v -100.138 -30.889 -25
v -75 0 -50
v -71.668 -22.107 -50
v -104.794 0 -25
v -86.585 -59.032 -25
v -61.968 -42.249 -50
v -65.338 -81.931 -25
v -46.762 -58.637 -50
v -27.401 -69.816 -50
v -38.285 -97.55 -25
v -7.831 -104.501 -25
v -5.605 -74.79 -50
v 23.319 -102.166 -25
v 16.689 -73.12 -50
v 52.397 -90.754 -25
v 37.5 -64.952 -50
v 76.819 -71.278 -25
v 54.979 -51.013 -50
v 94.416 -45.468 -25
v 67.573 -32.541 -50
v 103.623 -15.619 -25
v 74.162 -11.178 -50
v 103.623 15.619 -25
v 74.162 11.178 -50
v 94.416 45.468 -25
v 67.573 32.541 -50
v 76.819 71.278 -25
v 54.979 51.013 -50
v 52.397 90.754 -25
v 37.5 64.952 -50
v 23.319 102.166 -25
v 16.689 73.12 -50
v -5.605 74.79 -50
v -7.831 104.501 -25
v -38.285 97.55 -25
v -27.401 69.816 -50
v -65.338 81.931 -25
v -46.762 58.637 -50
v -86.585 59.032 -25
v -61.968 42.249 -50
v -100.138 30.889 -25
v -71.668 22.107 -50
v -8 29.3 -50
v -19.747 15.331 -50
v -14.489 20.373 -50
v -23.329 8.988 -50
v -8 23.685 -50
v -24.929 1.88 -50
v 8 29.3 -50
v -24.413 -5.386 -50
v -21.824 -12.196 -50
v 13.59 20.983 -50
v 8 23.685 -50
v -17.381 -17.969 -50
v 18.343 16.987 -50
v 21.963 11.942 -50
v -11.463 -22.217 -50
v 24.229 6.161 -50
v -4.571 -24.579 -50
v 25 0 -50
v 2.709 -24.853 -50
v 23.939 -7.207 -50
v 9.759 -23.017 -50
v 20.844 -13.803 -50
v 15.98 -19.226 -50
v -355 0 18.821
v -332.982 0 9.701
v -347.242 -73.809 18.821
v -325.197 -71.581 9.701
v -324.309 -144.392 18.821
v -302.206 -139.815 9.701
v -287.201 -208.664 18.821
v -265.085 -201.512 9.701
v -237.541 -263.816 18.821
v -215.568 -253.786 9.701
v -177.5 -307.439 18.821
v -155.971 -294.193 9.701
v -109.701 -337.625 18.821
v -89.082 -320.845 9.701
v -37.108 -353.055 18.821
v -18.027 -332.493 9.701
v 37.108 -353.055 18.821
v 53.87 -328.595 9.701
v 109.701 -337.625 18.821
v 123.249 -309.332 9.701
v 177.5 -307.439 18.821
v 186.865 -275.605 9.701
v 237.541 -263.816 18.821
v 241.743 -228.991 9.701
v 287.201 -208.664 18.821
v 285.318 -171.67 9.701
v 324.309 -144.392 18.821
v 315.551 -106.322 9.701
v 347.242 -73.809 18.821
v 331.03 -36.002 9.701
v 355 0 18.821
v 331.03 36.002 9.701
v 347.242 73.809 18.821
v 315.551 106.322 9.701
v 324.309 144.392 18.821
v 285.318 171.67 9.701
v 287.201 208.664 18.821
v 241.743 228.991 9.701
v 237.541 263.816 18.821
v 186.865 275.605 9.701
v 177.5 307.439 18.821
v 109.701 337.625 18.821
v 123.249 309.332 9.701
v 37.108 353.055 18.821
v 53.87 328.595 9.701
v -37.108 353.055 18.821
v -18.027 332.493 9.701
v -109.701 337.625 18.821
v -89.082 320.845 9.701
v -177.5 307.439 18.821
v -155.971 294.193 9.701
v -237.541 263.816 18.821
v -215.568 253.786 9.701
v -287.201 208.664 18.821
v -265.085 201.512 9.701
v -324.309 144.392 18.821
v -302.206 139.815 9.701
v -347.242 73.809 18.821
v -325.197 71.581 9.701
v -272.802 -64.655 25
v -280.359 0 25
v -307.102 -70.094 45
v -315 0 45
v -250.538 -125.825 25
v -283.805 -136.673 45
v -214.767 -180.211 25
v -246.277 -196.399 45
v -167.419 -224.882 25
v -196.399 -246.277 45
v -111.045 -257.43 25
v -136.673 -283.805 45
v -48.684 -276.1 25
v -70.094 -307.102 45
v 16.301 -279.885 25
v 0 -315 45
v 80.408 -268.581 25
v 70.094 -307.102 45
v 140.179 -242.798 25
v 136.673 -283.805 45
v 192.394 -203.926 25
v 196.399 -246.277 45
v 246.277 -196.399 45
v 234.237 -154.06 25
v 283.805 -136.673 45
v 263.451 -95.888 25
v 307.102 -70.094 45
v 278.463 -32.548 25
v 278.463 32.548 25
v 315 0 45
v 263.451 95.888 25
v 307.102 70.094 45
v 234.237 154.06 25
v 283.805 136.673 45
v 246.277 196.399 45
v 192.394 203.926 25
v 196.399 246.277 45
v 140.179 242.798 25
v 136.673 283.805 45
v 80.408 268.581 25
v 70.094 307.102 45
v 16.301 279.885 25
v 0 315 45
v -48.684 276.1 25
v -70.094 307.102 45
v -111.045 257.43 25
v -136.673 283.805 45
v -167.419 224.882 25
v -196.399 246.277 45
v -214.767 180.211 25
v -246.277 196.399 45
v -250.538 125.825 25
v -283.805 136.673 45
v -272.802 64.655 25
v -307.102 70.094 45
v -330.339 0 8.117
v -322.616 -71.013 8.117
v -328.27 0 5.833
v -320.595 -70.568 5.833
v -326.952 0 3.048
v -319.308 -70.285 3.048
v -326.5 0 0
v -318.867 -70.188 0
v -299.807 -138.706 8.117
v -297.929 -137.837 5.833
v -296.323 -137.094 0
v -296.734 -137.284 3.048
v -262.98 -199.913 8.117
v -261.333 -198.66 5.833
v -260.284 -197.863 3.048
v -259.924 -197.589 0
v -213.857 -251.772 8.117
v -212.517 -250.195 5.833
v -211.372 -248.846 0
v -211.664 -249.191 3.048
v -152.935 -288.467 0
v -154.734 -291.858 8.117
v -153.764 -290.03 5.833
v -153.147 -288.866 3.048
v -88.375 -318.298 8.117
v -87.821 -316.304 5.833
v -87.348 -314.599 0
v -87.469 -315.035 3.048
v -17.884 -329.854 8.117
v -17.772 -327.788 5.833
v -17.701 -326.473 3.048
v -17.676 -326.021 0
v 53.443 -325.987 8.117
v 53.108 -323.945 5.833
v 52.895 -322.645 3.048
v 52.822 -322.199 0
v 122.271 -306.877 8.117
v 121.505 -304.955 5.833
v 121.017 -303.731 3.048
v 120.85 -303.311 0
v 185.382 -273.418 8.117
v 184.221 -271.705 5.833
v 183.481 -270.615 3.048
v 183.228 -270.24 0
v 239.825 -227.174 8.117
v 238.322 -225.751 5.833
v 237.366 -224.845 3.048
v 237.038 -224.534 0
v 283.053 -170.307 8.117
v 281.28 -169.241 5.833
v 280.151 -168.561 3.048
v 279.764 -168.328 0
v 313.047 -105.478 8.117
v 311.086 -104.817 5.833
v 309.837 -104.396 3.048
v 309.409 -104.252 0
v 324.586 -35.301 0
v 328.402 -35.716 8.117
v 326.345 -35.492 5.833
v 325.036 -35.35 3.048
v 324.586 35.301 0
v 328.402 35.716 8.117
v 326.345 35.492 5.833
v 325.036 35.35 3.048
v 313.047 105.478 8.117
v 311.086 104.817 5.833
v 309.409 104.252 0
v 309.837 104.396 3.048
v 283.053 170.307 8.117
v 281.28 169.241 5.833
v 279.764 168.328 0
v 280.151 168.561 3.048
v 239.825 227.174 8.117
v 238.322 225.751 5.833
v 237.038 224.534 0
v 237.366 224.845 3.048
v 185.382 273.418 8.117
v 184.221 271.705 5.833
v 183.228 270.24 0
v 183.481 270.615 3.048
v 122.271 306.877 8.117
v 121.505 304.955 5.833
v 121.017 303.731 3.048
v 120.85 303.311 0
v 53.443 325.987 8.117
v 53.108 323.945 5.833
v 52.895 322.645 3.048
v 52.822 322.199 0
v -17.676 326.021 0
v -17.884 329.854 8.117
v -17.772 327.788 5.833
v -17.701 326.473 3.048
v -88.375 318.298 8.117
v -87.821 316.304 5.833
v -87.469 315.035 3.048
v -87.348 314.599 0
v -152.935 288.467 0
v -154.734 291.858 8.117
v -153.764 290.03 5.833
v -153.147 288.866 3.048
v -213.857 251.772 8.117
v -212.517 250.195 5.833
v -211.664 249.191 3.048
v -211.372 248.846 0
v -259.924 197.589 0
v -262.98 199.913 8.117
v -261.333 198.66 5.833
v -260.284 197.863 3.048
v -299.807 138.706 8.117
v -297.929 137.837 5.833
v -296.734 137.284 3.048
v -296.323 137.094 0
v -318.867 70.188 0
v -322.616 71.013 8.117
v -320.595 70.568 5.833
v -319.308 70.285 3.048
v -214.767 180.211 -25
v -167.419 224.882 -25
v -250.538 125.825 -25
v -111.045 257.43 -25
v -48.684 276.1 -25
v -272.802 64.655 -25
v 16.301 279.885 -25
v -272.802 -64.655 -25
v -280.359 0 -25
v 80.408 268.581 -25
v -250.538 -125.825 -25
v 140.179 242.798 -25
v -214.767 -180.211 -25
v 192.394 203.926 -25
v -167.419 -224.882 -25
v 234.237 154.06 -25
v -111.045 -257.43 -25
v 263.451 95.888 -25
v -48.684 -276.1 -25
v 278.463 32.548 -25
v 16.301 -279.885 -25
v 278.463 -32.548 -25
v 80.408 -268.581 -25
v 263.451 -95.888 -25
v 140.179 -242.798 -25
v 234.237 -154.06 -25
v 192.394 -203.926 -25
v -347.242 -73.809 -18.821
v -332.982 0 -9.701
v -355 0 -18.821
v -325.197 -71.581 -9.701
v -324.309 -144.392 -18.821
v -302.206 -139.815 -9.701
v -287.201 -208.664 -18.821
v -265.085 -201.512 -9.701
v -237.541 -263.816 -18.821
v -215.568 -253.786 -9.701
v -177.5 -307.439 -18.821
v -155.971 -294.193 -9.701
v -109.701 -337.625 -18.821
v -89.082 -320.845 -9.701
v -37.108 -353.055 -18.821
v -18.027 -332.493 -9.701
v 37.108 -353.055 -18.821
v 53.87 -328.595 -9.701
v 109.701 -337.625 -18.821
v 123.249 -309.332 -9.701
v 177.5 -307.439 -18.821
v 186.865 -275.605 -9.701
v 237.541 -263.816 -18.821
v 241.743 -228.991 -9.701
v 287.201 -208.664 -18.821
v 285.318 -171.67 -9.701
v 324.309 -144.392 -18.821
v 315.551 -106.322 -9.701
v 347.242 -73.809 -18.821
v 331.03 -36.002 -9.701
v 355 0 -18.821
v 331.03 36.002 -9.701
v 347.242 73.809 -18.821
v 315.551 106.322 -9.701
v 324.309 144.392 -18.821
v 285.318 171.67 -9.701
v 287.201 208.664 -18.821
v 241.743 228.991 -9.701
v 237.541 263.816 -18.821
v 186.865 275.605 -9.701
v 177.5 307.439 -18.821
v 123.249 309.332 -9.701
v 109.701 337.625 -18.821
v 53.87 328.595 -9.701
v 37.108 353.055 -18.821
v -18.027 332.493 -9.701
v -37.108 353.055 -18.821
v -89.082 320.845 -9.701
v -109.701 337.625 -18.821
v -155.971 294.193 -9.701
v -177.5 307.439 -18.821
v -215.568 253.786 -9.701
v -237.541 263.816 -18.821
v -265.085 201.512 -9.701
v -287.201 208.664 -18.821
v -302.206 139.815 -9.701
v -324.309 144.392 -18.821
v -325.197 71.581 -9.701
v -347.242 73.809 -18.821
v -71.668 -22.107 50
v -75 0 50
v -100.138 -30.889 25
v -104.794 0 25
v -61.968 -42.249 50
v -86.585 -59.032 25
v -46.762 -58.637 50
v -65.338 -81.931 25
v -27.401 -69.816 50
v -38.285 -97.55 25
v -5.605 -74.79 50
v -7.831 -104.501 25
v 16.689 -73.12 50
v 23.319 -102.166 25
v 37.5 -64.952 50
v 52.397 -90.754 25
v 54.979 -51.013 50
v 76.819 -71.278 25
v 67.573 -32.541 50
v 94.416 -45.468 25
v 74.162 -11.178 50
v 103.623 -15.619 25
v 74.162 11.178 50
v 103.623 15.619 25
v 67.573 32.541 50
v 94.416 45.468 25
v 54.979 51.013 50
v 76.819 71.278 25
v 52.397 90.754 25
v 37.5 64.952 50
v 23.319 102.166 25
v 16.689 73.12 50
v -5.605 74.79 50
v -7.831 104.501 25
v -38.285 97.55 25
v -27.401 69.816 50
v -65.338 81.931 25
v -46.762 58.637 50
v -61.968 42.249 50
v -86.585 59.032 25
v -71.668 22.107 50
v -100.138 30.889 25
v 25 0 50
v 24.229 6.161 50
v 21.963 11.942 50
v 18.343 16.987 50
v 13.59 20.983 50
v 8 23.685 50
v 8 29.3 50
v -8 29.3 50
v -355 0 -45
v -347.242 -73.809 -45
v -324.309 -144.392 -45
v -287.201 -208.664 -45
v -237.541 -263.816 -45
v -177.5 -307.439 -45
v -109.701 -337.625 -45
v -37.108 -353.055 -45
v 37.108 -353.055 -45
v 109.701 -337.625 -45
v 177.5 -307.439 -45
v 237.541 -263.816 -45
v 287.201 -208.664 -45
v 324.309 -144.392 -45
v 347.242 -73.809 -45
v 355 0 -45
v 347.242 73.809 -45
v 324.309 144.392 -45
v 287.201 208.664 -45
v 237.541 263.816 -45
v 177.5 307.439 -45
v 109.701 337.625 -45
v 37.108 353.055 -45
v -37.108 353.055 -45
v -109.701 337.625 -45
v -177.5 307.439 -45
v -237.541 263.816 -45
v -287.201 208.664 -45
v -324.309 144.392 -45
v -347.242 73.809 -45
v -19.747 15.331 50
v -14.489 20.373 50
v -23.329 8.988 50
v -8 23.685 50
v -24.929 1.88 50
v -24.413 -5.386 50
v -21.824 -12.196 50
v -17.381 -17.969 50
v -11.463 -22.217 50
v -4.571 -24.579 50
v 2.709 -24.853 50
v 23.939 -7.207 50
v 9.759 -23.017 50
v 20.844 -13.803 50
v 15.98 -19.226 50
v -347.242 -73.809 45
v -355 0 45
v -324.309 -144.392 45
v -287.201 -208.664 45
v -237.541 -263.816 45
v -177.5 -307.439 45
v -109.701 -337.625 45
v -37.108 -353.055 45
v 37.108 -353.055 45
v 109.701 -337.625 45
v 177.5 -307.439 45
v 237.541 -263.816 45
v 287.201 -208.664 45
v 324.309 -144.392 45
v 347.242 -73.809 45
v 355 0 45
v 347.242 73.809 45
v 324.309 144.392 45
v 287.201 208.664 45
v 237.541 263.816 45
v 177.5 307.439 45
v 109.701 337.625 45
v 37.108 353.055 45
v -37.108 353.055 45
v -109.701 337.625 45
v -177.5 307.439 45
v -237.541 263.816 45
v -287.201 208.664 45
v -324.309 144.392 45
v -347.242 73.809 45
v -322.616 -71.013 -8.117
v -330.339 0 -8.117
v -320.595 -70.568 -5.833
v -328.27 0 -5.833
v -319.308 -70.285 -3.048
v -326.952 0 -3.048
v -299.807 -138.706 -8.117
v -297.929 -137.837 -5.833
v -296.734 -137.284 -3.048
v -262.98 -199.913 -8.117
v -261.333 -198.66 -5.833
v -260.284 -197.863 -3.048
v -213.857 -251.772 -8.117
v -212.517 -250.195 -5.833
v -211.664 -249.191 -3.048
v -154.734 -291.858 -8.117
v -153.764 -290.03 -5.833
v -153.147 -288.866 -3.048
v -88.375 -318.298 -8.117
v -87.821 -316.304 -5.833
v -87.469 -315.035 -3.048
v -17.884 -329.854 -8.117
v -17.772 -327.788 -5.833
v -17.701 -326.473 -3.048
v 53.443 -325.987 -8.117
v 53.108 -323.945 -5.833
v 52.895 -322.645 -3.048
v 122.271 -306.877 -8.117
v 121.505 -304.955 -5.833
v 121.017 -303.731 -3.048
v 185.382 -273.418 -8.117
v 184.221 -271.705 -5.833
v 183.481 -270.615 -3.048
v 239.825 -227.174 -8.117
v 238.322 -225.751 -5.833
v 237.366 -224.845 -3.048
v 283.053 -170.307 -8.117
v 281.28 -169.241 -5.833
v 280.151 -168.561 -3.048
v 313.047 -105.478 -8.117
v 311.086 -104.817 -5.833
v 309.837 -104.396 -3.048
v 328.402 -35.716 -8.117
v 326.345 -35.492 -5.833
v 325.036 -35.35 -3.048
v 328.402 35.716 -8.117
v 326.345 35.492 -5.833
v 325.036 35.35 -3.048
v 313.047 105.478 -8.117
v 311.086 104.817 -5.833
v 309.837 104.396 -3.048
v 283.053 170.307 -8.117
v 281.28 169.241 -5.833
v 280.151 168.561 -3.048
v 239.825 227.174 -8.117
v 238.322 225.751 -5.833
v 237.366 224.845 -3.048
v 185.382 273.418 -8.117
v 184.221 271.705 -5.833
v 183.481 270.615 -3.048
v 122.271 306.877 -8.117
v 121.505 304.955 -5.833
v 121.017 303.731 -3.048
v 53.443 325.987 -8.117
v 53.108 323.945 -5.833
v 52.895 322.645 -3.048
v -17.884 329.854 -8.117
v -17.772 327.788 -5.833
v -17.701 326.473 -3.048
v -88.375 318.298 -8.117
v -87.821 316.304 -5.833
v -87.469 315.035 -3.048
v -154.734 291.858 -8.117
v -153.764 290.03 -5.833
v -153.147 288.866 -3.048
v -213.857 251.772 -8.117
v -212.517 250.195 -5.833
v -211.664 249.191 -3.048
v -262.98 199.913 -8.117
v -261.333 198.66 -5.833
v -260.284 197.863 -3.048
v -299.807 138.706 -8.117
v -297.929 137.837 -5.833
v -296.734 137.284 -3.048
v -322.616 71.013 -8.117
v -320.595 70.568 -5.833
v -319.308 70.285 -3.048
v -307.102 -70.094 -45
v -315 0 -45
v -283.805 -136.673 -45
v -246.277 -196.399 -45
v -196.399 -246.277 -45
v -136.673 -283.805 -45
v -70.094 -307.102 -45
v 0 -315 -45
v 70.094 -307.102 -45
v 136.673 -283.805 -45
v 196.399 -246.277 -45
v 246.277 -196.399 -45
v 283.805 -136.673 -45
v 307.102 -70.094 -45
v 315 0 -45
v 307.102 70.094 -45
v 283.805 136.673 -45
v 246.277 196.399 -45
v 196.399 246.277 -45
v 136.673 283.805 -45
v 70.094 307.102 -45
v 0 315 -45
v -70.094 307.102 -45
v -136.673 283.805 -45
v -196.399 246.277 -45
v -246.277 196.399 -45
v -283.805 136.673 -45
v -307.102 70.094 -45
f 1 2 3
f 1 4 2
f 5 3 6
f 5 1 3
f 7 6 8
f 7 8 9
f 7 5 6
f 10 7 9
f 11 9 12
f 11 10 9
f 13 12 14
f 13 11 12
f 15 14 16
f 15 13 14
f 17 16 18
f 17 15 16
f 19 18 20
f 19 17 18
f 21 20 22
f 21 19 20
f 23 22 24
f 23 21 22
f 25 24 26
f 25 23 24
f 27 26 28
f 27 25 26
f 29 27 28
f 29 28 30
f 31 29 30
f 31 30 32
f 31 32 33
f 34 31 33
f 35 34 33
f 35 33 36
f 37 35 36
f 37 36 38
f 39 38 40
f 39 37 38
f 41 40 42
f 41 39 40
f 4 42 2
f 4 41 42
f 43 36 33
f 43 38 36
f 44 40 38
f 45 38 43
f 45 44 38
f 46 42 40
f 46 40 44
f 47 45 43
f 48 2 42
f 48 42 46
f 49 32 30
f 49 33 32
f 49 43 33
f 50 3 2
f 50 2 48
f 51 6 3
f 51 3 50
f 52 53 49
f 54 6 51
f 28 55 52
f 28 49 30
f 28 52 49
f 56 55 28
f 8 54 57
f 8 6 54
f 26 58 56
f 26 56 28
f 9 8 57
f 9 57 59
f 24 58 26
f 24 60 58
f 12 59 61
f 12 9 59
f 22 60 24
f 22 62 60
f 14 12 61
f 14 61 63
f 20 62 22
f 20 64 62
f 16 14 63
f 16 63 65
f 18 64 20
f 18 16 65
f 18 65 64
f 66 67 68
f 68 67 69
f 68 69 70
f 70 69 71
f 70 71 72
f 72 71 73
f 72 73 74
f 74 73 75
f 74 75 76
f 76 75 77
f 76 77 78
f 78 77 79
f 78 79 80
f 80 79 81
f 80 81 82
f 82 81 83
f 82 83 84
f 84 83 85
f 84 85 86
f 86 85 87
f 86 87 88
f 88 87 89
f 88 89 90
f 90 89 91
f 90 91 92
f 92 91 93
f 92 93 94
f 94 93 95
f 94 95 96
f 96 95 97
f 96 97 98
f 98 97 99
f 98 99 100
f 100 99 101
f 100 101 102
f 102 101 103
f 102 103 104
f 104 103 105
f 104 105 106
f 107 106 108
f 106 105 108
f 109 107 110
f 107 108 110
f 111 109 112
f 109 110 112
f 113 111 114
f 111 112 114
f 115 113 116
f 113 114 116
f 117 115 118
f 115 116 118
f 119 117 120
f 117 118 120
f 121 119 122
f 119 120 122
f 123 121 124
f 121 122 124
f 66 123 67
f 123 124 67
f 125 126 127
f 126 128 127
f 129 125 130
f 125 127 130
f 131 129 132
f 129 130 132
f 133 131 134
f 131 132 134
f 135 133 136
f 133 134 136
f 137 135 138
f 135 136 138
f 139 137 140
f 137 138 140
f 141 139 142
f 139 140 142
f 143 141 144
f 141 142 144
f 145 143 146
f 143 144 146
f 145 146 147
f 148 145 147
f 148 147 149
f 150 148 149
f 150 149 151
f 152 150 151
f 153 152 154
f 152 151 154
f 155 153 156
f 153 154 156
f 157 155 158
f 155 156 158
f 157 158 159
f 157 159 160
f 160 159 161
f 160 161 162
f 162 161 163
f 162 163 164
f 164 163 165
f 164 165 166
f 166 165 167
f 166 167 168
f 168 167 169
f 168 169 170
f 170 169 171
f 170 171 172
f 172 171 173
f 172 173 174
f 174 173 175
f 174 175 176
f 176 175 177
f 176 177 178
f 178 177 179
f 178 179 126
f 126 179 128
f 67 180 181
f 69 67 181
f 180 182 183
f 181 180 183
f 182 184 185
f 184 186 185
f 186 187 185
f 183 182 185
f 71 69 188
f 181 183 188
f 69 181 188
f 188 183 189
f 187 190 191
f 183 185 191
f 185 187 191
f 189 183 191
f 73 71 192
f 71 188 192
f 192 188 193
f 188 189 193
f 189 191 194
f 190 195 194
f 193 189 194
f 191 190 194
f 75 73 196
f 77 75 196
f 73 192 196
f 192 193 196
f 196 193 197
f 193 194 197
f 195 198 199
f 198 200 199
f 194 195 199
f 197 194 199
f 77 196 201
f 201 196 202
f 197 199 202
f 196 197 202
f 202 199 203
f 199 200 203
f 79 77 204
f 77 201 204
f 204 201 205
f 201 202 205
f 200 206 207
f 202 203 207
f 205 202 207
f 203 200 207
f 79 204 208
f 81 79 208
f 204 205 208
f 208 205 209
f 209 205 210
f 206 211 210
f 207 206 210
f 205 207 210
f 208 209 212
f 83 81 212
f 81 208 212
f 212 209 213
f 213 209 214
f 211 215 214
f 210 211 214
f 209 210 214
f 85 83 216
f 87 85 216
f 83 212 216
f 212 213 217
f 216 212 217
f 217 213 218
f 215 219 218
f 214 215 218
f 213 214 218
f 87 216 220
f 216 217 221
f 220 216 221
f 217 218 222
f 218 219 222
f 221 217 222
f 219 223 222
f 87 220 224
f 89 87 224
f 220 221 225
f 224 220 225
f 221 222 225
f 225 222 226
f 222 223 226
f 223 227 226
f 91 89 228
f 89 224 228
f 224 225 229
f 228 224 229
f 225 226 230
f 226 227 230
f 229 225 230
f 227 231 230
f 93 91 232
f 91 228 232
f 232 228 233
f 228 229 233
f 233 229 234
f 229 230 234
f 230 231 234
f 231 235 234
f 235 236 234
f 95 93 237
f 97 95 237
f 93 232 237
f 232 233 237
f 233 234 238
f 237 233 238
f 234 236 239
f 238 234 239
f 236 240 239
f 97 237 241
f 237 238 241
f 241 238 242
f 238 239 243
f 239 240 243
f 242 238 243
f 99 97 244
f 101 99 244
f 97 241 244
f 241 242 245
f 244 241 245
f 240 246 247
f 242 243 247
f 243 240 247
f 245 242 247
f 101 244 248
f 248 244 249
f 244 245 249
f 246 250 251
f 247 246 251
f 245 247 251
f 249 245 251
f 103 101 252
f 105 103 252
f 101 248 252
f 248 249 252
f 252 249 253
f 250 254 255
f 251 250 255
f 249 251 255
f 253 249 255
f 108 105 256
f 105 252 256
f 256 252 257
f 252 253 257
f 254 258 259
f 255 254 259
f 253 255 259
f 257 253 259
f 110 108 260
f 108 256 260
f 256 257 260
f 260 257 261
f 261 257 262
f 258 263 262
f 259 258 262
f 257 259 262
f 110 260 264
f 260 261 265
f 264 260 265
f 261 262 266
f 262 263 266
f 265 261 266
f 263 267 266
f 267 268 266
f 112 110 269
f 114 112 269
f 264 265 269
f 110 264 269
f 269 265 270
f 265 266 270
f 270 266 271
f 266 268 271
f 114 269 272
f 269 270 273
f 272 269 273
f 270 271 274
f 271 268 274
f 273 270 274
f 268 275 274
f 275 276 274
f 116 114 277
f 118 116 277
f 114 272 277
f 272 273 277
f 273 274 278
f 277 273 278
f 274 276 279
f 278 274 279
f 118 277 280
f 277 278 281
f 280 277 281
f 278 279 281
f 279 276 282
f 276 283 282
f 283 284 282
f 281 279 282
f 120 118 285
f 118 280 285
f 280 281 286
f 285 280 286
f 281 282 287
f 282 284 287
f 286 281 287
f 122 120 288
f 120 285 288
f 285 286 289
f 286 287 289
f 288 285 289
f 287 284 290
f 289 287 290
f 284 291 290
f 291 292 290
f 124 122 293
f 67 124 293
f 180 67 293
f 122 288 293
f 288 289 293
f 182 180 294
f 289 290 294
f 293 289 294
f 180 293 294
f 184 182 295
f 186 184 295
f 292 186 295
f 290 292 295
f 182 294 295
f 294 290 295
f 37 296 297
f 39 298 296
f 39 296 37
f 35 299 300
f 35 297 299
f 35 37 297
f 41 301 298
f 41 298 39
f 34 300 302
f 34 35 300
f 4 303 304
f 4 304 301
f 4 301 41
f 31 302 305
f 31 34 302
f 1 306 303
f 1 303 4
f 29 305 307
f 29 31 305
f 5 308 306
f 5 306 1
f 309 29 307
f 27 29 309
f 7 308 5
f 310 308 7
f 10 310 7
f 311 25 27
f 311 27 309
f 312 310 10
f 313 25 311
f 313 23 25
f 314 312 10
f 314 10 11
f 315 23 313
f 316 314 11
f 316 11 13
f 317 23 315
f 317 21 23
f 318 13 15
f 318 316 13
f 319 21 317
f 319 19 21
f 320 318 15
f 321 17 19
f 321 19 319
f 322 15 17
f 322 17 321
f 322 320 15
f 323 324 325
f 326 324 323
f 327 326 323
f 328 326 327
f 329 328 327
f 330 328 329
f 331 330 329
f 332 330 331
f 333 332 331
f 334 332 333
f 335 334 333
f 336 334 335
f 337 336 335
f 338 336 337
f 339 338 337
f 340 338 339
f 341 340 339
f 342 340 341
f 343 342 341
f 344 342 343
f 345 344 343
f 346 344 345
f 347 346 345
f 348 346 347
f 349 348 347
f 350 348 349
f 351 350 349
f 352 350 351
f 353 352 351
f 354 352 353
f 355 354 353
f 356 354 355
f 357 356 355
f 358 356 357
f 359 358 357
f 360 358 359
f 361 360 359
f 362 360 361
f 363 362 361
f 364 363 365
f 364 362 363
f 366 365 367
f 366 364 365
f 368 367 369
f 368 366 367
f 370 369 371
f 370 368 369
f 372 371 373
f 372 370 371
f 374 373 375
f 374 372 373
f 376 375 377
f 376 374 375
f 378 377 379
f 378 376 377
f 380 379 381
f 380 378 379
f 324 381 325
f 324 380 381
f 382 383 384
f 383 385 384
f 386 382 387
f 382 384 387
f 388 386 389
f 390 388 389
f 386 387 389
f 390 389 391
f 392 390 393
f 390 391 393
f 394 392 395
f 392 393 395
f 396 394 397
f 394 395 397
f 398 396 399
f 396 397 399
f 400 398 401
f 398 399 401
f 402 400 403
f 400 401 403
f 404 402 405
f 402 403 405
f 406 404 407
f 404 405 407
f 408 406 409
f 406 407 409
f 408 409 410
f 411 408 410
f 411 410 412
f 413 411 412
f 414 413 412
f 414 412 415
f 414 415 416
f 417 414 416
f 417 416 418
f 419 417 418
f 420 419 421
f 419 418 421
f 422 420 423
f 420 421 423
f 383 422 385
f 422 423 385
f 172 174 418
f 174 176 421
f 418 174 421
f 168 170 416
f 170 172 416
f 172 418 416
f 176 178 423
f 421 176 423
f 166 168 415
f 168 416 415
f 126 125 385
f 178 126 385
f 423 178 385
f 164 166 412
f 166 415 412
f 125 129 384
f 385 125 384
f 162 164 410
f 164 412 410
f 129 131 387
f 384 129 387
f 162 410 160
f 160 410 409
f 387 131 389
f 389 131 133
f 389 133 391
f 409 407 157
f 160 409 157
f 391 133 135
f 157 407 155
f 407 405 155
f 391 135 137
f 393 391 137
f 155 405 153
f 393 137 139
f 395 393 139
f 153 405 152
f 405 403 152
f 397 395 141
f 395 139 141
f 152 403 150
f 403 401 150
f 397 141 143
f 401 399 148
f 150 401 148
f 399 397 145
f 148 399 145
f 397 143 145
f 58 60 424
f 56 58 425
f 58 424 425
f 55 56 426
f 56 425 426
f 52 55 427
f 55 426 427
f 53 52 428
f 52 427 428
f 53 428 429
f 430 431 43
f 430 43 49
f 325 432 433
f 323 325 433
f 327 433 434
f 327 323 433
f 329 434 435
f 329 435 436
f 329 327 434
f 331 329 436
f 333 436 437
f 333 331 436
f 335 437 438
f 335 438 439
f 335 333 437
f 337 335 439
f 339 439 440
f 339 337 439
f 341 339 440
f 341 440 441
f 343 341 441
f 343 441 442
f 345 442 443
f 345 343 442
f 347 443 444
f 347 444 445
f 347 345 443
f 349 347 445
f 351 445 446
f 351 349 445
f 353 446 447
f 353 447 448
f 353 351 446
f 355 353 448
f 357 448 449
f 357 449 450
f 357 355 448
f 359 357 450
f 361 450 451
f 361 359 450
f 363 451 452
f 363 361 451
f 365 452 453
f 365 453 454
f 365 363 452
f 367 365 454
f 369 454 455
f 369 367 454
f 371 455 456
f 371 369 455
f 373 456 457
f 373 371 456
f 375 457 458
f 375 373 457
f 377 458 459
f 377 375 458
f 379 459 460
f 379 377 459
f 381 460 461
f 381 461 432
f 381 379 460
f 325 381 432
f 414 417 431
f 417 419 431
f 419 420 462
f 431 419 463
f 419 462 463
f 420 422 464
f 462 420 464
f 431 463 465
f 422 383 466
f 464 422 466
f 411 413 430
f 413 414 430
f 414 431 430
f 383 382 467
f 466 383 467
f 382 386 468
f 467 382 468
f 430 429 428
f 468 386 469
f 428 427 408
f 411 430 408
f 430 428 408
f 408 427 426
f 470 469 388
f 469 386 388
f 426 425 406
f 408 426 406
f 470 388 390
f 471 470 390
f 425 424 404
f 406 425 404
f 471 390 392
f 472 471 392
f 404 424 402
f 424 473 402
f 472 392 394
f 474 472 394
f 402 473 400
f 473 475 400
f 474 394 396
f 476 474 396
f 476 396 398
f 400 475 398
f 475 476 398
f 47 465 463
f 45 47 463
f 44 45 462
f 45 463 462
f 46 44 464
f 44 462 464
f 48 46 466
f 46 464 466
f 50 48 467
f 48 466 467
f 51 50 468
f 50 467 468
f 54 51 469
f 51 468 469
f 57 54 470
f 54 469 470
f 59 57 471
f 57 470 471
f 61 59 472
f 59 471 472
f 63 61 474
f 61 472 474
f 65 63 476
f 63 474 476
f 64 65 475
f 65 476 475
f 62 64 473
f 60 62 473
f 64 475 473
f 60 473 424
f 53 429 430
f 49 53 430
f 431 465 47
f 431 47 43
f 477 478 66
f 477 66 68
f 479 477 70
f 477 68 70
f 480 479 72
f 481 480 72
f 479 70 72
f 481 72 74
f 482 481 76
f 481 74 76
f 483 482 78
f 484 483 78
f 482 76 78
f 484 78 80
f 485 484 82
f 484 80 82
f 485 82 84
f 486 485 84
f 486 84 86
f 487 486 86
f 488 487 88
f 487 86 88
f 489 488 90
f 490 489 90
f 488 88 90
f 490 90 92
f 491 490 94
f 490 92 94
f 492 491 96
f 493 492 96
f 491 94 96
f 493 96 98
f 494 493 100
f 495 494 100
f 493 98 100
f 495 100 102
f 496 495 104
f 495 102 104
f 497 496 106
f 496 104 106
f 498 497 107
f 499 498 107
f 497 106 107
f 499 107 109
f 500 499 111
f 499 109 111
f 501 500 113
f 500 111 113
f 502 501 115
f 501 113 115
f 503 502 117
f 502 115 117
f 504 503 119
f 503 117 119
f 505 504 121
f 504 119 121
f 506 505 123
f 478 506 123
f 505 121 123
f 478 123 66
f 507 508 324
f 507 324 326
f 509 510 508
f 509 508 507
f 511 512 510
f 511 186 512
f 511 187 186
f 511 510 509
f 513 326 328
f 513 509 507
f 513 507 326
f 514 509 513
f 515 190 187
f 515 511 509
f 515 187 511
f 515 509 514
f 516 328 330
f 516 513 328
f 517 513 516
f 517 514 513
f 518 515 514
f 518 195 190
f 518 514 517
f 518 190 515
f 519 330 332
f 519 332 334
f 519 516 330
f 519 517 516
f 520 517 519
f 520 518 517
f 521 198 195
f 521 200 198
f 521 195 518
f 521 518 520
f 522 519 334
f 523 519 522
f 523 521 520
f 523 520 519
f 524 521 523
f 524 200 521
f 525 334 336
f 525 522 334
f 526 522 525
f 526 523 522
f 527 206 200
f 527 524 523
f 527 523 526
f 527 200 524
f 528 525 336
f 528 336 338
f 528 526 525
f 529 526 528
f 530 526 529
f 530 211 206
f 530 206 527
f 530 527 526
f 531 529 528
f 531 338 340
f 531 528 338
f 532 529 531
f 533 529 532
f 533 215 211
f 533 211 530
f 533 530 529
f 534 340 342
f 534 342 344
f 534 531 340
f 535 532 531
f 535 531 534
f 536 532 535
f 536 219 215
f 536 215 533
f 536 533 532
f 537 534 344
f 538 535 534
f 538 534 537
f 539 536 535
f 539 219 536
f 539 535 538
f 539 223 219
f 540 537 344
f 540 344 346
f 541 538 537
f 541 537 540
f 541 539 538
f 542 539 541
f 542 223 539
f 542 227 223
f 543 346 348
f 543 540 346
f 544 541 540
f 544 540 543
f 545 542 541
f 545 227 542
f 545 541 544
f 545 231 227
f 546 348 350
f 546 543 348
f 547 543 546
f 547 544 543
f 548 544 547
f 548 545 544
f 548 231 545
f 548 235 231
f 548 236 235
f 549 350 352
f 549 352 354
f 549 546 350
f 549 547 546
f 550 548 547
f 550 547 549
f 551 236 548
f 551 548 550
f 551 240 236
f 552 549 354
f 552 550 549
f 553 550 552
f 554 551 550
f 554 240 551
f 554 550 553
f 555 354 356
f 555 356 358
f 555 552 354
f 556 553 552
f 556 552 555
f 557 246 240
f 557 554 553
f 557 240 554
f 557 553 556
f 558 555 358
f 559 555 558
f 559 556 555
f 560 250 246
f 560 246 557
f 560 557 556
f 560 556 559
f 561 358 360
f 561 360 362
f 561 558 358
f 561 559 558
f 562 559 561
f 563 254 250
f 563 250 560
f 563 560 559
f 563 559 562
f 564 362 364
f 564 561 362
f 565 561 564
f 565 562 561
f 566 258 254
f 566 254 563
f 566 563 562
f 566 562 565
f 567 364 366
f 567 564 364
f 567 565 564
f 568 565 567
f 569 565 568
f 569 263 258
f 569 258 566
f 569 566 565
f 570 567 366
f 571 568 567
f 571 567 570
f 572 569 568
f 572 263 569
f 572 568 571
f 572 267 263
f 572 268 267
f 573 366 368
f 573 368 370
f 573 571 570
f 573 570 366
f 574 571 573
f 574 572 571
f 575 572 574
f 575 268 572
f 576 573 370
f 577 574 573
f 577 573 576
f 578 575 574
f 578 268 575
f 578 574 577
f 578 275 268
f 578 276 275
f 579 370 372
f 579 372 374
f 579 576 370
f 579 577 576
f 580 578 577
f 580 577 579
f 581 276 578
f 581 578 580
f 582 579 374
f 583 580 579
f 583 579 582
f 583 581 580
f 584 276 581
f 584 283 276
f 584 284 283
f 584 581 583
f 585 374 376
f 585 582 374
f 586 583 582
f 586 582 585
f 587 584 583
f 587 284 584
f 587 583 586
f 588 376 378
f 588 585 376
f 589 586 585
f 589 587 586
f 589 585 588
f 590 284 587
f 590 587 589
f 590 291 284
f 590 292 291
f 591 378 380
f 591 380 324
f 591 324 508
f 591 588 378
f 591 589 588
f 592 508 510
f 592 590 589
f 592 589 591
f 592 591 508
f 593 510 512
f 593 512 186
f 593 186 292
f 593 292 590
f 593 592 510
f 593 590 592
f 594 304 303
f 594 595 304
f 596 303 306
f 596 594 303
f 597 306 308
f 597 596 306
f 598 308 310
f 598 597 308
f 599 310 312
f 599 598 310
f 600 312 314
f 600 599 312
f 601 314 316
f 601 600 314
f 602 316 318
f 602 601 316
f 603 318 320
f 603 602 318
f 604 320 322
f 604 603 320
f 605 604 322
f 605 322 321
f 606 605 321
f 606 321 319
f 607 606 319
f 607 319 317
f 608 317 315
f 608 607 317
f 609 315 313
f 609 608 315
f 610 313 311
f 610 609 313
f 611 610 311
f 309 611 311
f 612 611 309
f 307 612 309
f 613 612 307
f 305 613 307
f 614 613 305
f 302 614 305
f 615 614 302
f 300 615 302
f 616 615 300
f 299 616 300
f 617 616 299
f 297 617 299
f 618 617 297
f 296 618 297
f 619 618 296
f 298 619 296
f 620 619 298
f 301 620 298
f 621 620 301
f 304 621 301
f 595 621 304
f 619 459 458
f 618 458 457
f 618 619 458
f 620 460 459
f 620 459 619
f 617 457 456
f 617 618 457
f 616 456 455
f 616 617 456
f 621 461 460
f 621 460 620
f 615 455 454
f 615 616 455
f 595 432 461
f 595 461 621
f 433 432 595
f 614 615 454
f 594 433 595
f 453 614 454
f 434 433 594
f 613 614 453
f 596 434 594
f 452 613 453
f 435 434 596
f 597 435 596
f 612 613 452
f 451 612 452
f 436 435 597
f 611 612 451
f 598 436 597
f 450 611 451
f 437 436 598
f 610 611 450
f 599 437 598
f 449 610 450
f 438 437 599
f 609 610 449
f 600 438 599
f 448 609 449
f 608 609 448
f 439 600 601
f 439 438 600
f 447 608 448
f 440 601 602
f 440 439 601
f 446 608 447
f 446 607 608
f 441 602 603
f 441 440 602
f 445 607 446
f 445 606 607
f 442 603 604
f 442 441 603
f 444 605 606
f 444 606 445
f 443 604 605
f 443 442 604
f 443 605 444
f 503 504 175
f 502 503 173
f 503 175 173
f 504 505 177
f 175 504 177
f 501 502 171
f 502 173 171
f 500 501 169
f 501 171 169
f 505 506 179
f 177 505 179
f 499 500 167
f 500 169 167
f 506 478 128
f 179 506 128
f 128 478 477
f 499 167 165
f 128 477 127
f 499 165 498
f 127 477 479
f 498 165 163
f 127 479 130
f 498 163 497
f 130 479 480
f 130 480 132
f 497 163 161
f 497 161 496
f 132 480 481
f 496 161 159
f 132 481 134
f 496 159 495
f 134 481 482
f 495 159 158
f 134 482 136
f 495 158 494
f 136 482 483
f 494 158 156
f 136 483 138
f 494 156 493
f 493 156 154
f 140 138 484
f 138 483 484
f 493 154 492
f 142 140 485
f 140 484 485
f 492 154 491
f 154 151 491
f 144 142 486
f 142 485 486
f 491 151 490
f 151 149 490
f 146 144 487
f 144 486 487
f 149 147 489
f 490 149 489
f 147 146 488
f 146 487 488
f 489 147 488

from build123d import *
from build123d.topology import SkipClean

# Parameters (mm, degrees)
ESQUISSE2_R             = 25
ENL_V_MAT_EXTRU_1_DEPTH = 512.908194894
ESQUISSE3_W             = 16
ESQUISSE3_H             = 8.6
ENL_V_MAT_EXTRU_2_DEPTH = 512.908194894


with BuildPart() as part:
    # Esquisse1 → Révolution1 (revolve)
    with BuildSketch(Plane(origin=(0, 0, 0), x_dir=(0, 0, -1), z_dir=(1, 0, 0)), mode=Mode.PRIVATE) as r_volution1_sk:
        with BuildLine():
            Line((0, 0), (-50, 0))
            Line((-50, 0), (-50, 75))
            Line((-50, 75), (-25, 104.793839815))
            Line((-25, 104.793839815), (-25, 280.358983849))
            Line((-25, 280.358983849), (-45, 315))
            Line((-45, 315), (-45, 355))
            Line((-45, 355), (-18.820962226, 355))
            Line((-18.820962226, 355), (-9.700735091, 332.98182396))
            ThreePointArc((-9.700735091, 332.98182396), (-5.833487447, 328.269569071), (0, 326.5))
            Line((0, 326.5), (0, 0))
        make_face()
    r_volution1 = revolve(r_volution1_sk.sketch.rotate(Axis((0, 0, 0), (0, 0, 1)), 90), axis=Axis((0, 0, 0), (0, 0, 1)))

    # Symétrie1: Révolution1 across plane
    with SkipClean():  # the faces are left unmerged after this step: merging them gives an invalid solid
        add(r_volution1.mirror(Plane(origin=(0, 326.5, 0), x_dir=(1, 0, 0), z_dir=(0, 0, -1))))

    # Esquisse2 → Enlèv. mat.-Extru.1 (cut, through all)
    with SkipClean():  # the faces are left unmerged after this step: merging them gives an invalid solid
        with BuildSketch(Plane.XY.offset(50)):
            Circle(ESQUISSE2_R)
        extrude(amount=-ENL_V_MAT_EXTRU_1_DEPTH, mode=Mode.SUBTRACT)

    # Esquisse3 → Enlèv. mat.-Extru.2 (cut, through all)
    with SkipClean():  # the faces are left unmerged after this step: merging them gives an invalid solid
        with BuildSketch(Plane.XY.offset(50)):
            with Locations((0, 25)):
                Rectangle(ESQUISSE3_W, ESQUISSE3_H)
        extrude(amount=-ENL_V_MAT_EXTRU_2_DEPTH, mode=Mode.SUBTRACT)


solid = part.part
